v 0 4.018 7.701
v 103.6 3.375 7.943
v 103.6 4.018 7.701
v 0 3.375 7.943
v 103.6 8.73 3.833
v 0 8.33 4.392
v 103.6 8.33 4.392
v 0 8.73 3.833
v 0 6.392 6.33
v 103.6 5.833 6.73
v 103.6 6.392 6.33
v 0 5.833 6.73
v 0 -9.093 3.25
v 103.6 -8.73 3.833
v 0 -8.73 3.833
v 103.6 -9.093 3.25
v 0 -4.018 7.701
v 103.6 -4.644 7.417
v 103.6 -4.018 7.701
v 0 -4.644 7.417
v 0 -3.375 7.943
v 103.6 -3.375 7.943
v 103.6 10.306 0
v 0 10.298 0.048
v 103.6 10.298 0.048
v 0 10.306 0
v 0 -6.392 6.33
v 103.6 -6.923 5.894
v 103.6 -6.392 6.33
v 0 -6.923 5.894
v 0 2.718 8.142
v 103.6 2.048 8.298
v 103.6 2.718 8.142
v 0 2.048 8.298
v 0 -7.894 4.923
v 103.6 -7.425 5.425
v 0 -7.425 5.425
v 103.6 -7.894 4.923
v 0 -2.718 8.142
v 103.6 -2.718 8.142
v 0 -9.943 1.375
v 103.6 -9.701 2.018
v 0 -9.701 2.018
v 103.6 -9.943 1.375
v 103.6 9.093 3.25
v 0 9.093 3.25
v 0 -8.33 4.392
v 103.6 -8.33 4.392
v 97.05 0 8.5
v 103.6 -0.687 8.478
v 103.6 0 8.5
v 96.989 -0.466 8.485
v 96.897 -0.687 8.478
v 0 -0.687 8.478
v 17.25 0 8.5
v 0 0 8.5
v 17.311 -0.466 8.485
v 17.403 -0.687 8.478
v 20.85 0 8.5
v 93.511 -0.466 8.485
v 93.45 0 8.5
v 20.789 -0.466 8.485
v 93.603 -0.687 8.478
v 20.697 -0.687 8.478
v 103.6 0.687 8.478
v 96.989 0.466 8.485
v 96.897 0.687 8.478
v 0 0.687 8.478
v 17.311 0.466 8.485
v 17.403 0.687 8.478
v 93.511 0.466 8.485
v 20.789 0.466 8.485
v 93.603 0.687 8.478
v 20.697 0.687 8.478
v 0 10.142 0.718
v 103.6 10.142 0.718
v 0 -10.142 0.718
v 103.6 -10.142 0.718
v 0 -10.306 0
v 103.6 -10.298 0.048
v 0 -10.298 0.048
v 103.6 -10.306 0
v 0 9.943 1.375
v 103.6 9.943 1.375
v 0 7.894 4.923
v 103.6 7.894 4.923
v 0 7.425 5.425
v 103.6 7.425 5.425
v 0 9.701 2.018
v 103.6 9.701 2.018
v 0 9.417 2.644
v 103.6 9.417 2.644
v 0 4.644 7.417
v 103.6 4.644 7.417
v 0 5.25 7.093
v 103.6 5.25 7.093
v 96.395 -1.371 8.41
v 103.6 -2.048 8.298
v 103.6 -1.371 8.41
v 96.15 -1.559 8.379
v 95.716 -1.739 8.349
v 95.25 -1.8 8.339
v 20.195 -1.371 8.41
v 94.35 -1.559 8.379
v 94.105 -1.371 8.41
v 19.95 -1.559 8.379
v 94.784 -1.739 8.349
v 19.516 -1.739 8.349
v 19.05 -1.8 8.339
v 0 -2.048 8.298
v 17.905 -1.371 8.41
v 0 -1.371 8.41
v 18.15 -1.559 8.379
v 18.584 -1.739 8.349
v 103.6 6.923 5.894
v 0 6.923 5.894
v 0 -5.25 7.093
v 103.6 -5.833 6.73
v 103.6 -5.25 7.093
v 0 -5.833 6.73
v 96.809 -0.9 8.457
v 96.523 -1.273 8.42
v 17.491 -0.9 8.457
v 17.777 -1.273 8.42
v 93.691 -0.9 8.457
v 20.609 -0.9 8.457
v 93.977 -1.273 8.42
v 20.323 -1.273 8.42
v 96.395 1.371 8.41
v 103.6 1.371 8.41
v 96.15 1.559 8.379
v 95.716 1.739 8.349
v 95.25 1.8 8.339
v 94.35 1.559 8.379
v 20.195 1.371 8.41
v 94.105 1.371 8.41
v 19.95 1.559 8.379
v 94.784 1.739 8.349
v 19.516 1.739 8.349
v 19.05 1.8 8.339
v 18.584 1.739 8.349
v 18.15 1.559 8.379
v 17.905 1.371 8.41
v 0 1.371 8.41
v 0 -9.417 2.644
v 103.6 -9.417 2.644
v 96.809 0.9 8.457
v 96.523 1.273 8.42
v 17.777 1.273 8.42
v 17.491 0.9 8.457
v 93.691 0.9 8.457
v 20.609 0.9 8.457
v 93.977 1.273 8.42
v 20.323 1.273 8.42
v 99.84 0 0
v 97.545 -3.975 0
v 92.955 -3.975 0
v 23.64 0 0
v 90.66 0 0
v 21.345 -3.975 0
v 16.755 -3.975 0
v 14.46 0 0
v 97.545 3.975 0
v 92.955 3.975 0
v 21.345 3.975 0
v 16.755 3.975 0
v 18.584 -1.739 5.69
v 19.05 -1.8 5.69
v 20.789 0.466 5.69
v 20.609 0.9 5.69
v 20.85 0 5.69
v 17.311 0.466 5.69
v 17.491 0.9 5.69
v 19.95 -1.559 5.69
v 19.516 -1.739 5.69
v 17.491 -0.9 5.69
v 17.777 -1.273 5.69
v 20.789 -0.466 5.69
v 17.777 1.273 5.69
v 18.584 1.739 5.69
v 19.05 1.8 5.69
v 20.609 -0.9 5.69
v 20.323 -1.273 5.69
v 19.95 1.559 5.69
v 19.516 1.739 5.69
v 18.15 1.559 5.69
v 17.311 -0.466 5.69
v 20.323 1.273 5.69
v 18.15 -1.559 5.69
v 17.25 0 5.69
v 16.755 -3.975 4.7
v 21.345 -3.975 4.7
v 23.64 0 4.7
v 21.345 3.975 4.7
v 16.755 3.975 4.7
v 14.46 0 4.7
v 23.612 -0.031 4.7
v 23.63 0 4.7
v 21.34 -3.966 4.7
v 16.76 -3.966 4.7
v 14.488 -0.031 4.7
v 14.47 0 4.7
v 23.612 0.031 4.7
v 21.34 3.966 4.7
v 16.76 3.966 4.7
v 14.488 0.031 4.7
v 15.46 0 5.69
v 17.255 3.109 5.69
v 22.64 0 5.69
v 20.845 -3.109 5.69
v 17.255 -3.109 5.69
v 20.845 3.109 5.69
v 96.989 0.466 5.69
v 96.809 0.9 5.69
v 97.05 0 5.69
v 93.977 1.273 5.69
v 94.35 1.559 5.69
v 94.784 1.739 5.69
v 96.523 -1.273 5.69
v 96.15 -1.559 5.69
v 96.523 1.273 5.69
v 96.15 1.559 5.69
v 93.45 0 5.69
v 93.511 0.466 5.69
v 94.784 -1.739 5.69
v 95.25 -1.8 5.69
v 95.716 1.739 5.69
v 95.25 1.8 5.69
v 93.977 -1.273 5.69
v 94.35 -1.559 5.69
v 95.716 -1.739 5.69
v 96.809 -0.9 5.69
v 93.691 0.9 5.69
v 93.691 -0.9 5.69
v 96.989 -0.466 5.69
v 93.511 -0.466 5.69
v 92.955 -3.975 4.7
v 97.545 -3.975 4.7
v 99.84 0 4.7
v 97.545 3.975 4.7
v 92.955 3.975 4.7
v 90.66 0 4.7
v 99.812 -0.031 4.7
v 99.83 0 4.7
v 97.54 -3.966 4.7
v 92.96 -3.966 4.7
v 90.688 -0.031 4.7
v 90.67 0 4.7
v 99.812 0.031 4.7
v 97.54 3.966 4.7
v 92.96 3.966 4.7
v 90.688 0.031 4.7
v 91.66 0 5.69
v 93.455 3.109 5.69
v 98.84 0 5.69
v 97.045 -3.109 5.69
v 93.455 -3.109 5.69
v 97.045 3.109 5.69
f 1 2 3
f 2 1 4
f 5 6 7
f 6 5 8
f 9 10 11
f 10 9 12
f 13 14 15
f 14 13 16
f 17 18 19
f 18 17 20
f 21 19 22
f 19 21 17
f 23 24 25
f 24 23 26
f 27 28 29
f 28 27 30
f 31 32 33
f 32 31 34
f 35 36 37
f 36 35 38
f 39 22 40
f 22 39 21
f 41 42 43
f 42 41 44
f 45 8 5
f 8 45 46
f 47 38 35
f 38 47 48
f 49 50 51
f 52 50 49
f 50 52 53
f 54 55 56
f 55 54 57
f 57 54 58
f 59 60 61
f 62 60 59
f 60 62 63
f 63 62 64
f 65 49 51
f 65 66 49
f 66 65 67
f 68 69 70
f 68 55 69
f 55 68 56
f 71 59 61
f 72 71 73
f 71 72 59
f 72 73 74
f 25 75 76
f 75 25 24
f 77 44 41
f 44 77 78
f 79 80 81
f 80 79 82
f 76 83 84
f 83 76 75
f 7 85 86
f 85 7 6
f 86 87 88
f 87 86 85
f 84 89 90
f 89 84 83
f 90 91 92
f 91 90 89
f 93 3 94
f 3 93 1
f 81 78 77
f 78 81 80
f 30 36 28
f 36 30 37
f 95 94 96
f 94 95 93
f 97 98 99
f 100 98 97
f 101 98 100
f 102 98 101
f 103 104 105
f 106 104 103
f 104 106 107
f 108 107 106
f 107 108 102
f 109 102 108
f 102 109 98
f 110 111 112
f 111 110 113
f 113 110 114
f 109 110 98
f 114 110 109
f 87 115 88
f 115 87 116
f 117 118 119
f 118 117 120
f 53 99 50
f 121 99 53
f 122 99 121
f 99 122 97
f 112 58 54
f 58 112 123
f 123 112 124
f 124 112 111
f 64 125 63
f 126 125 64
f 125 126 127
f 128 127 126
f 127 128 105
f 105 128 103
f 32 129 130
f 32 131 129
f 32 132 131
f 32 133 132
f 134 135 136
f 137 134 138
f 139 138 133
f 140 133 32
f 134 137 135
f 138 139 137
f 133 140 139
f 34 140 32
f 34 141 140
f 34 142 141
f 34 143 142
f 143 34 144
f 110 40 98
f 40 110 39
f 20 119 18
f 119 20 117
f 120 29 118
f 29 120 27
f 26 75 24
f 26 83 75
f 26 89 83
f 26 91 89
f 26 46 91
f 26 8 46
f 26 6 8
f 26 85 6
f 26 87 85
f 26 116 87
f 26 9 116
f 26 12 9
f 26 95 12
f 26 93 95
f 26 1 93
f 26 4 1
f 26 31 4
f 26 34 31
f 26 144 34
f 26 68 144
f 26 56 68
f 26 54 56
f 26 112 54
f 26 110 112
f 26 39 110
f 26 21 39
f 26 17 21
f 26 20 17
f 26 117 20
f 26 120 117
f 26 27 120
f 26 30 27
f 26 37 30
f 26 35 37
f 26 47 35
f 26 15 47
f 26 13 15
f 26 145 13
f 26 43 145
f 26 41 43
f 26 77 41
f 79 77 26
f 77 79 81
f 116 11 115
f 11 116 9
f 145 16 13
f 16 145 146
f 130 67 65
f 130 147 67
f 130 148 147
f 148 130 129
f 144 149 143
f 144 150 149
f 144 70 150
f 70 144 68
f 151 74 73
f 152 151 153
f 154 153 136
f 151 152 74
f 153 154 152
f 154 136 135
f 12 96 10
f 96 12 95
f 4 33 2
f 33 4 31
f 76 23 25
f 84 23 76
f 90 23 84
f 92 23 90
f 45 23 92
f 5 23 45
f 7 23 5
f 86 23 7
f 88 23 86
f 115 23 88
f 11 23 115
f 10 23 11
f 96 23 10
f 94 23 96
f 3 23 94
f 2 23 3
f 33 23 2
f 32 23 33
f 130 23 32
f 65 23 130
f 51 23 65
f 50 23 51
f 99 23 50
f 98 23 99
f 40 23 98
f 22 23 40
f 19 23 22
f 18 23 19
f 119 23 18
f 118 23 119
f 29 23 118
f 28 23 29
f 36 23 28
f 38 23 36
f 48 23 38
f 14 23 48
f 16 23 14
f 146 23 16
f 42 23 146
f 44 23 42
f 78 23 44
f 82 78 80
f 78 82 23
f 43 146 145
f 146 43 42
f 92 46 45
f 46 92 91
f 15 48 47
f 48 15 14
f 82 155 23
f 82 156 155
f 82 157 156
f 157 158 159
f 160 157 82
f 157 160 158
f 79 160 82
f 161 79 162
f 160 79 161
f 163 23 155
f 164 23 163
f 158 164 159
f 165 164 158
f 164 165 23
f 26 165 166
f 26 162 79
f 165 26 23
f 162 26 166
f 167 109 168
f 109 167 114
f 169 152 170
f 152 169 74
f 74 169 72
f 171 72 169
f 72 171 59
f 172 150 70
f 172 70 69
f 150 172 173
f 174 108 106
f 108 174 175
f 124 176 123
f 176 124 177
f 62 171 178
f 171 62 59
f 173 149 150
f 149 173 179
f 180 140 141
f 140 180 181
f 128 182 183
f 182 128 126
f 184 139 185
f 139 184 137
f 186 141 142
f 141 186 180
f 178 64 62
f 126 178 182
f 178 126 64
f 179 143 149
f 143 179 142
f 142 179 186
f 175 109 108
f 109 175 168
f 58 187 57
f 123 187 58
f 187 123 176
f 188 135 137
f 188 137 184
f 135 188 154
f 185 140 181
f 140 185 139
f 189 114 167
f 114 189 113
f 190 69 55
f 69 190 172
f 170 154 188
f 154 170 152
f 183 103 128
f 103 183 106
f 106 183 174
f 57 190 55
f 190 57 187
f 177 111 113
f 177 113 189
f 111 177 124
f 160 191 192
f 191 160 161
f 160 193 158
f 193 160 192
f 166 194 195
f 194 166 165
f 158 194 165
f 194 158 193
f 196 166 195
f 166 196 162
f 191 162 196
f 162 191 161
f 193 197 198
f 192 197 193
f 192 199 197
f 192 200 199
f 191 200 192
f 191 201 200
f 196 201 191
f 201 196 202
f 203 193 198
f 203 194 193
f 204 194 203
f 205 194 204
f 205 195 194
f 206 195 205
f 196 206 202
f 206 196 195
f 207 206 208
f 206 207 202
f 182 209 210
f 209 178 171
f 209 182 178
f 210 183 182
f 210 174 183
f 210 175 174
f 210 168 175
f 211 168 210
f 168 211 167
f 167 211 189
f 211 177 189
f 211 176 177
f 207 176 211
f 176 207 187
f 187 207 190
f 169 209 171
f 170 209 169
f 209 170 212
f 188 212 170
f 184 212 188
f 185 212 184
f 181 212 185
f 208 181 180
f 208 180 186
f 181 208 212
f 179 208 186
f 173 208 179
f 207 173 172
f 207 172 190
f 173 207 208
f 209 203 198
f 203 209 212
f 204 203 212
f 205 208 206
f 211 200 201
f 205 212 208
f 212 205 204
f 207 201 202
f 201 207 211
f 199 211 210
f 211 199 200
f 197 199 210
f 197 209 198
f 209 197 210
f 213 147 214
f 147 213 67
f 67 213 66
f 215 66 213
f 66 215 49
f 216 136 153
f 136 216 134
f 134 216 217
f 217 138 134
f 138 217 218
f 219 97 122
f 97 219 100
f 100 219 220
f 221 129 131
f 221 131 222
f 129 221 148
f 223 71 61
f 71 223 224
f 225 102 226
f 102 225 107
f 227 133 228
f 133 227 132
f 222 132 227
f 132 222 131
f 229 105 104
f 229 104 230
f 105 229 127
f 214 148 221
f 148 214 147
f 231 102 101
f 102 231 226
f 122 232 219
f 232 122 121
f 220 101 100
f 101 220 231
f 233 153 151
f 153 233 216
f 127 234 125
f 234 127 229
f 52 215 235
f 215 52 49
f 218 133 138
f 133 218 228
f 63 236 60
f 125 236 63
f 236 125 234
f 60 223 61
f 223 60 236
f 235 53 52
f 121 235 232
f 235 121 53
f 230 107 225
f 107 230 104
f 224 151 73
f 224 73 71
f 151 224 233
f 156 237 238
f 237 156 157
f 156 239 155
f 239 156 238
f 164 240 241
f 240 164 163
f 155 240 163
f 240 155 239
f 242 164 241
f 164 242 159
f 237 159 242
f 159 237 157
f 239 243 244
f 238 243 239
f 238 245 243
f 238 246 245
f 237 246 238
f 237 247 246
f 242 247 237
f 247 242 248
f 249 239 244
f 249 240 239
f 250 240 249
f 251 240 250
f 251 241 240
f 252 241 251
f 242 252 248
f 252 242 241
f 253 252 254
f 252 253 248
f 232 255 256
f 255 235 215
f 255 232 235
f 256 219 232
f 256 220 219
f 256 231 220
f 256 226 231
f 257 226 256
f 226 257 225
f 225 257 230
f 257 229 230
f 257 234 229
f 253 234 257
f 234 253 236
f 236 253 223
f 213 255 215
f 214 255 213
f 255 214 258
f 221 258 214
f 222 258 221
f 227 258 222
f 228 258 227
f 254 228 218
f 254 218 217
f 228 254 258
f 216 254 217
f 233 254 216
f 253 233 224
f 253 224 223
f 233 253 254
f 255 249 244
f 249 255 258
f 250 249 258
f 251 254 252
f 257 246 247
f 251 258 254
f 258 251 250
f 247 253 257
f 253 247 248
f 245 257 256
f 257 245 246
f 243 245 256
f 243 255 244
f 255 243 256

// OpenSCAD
//Parametric Nut trap for Mostly Printed CNC Router
//July 7,2015 By: David Bunch
//
//I needed to make a length that would fit with my customized tool holder for
//a Mastergrip rotary tool I bought at Costco years ago, so I decided to make it parametric.
//Spacing for my tool holder is 53mm distance between holes

//Even though this is for the U.S. Standard Version, I use mm for dimensions

//CUSTOMIZER VARIABLES

//1. Spacing between Nuts
NutSpacing=76.2;     //mm spacing between Nuts (original design seems to be 76.2mm)

//2. Diameter of Nut Holder (21mm is U.S. Version Size)
THNT_Dia=21;      //Dia Tool Holder Nut Trap

//3. Resolution of Nut Holder (96 gives you about .7mm length segments in curve)
ires=96;    //Number of  segments for Tool Holder
                    //Circumference of 21mm Dia circle is 65.97
                    //Making each segment about .7mm will give you 96 for the number of sides

//4. Diameter of Bolt Threading
M3Dia=3.6;             //Dia. of Hole

//5. Resolution of Bolt Threads (24 gives .47mm length segments in curve)
M3_ires=24;         //Number of segments for M3 holes (.47mm segments)
                    //original design was 180 sides (.06mm segments)
//6. Diameter of Nut
M3NutDia=9.18;

//7. Height of Nut trap
M3Nut_Ht=4.7;

//8. Offset from Left for 1st Nut Trap
LtNutOffset=19.05;      //Original Design is 19.05mm

//9. Offset from Right of 2nd Nut Trap (Original is 6.35mm)
RtNutOffset=8.35;       //(I decided to add 2mm to this gap)

//10. Rotation of Nut Trap (0 = Original or 30 = Nut face parallel with End)
RotNut=0;	//	[0:Original, 30:parallel with End]

//11. Print 1 or 2 Nut Traps
Qty=1;

//12. Change this number to make it thicker or thinner
Z_Origin=-2;      //Z origin of Nut trap profile cylinder to extrude
//CUSTOMIZER VARIABLES END
//----------------------------------------
//	This creates a drop down box of numbered options

Len=LtNutOffset+RtNutOffset+NutSpacing;     //Total Length of Nut Trap
echo("Len = ",Len);
RtNut_X=Len-RtNutOffset;



//Len=101.6;   //Original Tool Holder Nut Trap length was 101.6
Cube_z=(Z_Origin + 30)* (-1);
module Base()
{
    difference()
    {
        translate([0,0,Z_Origin])
        rotate([0,90,0])
        cylinder(d=THNT_Dia,h=Len,$fn=ires);
        translate([-1,-15,-30])
        cube([Len+2,30,30]);
    }
}
module DrawFinal()
{
    difference()
    {
        Base();
//Drill the Left Bolt Hole
        translate([LtNutOffset,0,-1])
        cylinder(d=M3Dia,h=12,$fn=M3_ires);
//Cut Left Nut Trap
        translate([LtNutOffset,0,-1])
        rotate([0,0,RotNut])            //Rotate Nut either 0 or 30
                                        //rotating 30 gives more plastic between Nut and end
        cylinder(d=M3NutDia,h=M3Nut_Ht+1,$fn=6);        //6 sided Nut trap hole
        translate([LtNutOffset,0,M3Nut_Ht-.01])
        rotate([0,0,RotNut])            //Rotate Nut either 0 or 30
        cylinder(d1=M3NutDia,d2=M3NutDia-2,h=1,$fn=6);  //Add slight taper for nut hole
//Drill the Right Bolt Hole
        translate([RtNut_X,0,-1])
        cylinder(d=M3Dia,h=12,$fn=M3_ires);
//Cut Right Nut Trap
        translate([RtNut_X,0,-1])
        rotate([0,0,RotNut])            //Rotate Nut either 0 or 30
        cylinder(d=M3NutDia,h=M3Nut_Ht+1,$fn=6);        //6 sided Nut trap hole
        translate([RtNut_X,0,M3Nut_Ht-.01])
        rotate([0,0,RotNut])            //Rotate Nut either 0 or 30
        cylinder(d1=M3NutDia,d2=M3NutDia-2,h=1,$fn=6);  //Add slight taper for nut hole
    }
}
DrawFinal();
if (Qty == 2)
{
    translate([0,25,0])
    DrawFinal();
}
